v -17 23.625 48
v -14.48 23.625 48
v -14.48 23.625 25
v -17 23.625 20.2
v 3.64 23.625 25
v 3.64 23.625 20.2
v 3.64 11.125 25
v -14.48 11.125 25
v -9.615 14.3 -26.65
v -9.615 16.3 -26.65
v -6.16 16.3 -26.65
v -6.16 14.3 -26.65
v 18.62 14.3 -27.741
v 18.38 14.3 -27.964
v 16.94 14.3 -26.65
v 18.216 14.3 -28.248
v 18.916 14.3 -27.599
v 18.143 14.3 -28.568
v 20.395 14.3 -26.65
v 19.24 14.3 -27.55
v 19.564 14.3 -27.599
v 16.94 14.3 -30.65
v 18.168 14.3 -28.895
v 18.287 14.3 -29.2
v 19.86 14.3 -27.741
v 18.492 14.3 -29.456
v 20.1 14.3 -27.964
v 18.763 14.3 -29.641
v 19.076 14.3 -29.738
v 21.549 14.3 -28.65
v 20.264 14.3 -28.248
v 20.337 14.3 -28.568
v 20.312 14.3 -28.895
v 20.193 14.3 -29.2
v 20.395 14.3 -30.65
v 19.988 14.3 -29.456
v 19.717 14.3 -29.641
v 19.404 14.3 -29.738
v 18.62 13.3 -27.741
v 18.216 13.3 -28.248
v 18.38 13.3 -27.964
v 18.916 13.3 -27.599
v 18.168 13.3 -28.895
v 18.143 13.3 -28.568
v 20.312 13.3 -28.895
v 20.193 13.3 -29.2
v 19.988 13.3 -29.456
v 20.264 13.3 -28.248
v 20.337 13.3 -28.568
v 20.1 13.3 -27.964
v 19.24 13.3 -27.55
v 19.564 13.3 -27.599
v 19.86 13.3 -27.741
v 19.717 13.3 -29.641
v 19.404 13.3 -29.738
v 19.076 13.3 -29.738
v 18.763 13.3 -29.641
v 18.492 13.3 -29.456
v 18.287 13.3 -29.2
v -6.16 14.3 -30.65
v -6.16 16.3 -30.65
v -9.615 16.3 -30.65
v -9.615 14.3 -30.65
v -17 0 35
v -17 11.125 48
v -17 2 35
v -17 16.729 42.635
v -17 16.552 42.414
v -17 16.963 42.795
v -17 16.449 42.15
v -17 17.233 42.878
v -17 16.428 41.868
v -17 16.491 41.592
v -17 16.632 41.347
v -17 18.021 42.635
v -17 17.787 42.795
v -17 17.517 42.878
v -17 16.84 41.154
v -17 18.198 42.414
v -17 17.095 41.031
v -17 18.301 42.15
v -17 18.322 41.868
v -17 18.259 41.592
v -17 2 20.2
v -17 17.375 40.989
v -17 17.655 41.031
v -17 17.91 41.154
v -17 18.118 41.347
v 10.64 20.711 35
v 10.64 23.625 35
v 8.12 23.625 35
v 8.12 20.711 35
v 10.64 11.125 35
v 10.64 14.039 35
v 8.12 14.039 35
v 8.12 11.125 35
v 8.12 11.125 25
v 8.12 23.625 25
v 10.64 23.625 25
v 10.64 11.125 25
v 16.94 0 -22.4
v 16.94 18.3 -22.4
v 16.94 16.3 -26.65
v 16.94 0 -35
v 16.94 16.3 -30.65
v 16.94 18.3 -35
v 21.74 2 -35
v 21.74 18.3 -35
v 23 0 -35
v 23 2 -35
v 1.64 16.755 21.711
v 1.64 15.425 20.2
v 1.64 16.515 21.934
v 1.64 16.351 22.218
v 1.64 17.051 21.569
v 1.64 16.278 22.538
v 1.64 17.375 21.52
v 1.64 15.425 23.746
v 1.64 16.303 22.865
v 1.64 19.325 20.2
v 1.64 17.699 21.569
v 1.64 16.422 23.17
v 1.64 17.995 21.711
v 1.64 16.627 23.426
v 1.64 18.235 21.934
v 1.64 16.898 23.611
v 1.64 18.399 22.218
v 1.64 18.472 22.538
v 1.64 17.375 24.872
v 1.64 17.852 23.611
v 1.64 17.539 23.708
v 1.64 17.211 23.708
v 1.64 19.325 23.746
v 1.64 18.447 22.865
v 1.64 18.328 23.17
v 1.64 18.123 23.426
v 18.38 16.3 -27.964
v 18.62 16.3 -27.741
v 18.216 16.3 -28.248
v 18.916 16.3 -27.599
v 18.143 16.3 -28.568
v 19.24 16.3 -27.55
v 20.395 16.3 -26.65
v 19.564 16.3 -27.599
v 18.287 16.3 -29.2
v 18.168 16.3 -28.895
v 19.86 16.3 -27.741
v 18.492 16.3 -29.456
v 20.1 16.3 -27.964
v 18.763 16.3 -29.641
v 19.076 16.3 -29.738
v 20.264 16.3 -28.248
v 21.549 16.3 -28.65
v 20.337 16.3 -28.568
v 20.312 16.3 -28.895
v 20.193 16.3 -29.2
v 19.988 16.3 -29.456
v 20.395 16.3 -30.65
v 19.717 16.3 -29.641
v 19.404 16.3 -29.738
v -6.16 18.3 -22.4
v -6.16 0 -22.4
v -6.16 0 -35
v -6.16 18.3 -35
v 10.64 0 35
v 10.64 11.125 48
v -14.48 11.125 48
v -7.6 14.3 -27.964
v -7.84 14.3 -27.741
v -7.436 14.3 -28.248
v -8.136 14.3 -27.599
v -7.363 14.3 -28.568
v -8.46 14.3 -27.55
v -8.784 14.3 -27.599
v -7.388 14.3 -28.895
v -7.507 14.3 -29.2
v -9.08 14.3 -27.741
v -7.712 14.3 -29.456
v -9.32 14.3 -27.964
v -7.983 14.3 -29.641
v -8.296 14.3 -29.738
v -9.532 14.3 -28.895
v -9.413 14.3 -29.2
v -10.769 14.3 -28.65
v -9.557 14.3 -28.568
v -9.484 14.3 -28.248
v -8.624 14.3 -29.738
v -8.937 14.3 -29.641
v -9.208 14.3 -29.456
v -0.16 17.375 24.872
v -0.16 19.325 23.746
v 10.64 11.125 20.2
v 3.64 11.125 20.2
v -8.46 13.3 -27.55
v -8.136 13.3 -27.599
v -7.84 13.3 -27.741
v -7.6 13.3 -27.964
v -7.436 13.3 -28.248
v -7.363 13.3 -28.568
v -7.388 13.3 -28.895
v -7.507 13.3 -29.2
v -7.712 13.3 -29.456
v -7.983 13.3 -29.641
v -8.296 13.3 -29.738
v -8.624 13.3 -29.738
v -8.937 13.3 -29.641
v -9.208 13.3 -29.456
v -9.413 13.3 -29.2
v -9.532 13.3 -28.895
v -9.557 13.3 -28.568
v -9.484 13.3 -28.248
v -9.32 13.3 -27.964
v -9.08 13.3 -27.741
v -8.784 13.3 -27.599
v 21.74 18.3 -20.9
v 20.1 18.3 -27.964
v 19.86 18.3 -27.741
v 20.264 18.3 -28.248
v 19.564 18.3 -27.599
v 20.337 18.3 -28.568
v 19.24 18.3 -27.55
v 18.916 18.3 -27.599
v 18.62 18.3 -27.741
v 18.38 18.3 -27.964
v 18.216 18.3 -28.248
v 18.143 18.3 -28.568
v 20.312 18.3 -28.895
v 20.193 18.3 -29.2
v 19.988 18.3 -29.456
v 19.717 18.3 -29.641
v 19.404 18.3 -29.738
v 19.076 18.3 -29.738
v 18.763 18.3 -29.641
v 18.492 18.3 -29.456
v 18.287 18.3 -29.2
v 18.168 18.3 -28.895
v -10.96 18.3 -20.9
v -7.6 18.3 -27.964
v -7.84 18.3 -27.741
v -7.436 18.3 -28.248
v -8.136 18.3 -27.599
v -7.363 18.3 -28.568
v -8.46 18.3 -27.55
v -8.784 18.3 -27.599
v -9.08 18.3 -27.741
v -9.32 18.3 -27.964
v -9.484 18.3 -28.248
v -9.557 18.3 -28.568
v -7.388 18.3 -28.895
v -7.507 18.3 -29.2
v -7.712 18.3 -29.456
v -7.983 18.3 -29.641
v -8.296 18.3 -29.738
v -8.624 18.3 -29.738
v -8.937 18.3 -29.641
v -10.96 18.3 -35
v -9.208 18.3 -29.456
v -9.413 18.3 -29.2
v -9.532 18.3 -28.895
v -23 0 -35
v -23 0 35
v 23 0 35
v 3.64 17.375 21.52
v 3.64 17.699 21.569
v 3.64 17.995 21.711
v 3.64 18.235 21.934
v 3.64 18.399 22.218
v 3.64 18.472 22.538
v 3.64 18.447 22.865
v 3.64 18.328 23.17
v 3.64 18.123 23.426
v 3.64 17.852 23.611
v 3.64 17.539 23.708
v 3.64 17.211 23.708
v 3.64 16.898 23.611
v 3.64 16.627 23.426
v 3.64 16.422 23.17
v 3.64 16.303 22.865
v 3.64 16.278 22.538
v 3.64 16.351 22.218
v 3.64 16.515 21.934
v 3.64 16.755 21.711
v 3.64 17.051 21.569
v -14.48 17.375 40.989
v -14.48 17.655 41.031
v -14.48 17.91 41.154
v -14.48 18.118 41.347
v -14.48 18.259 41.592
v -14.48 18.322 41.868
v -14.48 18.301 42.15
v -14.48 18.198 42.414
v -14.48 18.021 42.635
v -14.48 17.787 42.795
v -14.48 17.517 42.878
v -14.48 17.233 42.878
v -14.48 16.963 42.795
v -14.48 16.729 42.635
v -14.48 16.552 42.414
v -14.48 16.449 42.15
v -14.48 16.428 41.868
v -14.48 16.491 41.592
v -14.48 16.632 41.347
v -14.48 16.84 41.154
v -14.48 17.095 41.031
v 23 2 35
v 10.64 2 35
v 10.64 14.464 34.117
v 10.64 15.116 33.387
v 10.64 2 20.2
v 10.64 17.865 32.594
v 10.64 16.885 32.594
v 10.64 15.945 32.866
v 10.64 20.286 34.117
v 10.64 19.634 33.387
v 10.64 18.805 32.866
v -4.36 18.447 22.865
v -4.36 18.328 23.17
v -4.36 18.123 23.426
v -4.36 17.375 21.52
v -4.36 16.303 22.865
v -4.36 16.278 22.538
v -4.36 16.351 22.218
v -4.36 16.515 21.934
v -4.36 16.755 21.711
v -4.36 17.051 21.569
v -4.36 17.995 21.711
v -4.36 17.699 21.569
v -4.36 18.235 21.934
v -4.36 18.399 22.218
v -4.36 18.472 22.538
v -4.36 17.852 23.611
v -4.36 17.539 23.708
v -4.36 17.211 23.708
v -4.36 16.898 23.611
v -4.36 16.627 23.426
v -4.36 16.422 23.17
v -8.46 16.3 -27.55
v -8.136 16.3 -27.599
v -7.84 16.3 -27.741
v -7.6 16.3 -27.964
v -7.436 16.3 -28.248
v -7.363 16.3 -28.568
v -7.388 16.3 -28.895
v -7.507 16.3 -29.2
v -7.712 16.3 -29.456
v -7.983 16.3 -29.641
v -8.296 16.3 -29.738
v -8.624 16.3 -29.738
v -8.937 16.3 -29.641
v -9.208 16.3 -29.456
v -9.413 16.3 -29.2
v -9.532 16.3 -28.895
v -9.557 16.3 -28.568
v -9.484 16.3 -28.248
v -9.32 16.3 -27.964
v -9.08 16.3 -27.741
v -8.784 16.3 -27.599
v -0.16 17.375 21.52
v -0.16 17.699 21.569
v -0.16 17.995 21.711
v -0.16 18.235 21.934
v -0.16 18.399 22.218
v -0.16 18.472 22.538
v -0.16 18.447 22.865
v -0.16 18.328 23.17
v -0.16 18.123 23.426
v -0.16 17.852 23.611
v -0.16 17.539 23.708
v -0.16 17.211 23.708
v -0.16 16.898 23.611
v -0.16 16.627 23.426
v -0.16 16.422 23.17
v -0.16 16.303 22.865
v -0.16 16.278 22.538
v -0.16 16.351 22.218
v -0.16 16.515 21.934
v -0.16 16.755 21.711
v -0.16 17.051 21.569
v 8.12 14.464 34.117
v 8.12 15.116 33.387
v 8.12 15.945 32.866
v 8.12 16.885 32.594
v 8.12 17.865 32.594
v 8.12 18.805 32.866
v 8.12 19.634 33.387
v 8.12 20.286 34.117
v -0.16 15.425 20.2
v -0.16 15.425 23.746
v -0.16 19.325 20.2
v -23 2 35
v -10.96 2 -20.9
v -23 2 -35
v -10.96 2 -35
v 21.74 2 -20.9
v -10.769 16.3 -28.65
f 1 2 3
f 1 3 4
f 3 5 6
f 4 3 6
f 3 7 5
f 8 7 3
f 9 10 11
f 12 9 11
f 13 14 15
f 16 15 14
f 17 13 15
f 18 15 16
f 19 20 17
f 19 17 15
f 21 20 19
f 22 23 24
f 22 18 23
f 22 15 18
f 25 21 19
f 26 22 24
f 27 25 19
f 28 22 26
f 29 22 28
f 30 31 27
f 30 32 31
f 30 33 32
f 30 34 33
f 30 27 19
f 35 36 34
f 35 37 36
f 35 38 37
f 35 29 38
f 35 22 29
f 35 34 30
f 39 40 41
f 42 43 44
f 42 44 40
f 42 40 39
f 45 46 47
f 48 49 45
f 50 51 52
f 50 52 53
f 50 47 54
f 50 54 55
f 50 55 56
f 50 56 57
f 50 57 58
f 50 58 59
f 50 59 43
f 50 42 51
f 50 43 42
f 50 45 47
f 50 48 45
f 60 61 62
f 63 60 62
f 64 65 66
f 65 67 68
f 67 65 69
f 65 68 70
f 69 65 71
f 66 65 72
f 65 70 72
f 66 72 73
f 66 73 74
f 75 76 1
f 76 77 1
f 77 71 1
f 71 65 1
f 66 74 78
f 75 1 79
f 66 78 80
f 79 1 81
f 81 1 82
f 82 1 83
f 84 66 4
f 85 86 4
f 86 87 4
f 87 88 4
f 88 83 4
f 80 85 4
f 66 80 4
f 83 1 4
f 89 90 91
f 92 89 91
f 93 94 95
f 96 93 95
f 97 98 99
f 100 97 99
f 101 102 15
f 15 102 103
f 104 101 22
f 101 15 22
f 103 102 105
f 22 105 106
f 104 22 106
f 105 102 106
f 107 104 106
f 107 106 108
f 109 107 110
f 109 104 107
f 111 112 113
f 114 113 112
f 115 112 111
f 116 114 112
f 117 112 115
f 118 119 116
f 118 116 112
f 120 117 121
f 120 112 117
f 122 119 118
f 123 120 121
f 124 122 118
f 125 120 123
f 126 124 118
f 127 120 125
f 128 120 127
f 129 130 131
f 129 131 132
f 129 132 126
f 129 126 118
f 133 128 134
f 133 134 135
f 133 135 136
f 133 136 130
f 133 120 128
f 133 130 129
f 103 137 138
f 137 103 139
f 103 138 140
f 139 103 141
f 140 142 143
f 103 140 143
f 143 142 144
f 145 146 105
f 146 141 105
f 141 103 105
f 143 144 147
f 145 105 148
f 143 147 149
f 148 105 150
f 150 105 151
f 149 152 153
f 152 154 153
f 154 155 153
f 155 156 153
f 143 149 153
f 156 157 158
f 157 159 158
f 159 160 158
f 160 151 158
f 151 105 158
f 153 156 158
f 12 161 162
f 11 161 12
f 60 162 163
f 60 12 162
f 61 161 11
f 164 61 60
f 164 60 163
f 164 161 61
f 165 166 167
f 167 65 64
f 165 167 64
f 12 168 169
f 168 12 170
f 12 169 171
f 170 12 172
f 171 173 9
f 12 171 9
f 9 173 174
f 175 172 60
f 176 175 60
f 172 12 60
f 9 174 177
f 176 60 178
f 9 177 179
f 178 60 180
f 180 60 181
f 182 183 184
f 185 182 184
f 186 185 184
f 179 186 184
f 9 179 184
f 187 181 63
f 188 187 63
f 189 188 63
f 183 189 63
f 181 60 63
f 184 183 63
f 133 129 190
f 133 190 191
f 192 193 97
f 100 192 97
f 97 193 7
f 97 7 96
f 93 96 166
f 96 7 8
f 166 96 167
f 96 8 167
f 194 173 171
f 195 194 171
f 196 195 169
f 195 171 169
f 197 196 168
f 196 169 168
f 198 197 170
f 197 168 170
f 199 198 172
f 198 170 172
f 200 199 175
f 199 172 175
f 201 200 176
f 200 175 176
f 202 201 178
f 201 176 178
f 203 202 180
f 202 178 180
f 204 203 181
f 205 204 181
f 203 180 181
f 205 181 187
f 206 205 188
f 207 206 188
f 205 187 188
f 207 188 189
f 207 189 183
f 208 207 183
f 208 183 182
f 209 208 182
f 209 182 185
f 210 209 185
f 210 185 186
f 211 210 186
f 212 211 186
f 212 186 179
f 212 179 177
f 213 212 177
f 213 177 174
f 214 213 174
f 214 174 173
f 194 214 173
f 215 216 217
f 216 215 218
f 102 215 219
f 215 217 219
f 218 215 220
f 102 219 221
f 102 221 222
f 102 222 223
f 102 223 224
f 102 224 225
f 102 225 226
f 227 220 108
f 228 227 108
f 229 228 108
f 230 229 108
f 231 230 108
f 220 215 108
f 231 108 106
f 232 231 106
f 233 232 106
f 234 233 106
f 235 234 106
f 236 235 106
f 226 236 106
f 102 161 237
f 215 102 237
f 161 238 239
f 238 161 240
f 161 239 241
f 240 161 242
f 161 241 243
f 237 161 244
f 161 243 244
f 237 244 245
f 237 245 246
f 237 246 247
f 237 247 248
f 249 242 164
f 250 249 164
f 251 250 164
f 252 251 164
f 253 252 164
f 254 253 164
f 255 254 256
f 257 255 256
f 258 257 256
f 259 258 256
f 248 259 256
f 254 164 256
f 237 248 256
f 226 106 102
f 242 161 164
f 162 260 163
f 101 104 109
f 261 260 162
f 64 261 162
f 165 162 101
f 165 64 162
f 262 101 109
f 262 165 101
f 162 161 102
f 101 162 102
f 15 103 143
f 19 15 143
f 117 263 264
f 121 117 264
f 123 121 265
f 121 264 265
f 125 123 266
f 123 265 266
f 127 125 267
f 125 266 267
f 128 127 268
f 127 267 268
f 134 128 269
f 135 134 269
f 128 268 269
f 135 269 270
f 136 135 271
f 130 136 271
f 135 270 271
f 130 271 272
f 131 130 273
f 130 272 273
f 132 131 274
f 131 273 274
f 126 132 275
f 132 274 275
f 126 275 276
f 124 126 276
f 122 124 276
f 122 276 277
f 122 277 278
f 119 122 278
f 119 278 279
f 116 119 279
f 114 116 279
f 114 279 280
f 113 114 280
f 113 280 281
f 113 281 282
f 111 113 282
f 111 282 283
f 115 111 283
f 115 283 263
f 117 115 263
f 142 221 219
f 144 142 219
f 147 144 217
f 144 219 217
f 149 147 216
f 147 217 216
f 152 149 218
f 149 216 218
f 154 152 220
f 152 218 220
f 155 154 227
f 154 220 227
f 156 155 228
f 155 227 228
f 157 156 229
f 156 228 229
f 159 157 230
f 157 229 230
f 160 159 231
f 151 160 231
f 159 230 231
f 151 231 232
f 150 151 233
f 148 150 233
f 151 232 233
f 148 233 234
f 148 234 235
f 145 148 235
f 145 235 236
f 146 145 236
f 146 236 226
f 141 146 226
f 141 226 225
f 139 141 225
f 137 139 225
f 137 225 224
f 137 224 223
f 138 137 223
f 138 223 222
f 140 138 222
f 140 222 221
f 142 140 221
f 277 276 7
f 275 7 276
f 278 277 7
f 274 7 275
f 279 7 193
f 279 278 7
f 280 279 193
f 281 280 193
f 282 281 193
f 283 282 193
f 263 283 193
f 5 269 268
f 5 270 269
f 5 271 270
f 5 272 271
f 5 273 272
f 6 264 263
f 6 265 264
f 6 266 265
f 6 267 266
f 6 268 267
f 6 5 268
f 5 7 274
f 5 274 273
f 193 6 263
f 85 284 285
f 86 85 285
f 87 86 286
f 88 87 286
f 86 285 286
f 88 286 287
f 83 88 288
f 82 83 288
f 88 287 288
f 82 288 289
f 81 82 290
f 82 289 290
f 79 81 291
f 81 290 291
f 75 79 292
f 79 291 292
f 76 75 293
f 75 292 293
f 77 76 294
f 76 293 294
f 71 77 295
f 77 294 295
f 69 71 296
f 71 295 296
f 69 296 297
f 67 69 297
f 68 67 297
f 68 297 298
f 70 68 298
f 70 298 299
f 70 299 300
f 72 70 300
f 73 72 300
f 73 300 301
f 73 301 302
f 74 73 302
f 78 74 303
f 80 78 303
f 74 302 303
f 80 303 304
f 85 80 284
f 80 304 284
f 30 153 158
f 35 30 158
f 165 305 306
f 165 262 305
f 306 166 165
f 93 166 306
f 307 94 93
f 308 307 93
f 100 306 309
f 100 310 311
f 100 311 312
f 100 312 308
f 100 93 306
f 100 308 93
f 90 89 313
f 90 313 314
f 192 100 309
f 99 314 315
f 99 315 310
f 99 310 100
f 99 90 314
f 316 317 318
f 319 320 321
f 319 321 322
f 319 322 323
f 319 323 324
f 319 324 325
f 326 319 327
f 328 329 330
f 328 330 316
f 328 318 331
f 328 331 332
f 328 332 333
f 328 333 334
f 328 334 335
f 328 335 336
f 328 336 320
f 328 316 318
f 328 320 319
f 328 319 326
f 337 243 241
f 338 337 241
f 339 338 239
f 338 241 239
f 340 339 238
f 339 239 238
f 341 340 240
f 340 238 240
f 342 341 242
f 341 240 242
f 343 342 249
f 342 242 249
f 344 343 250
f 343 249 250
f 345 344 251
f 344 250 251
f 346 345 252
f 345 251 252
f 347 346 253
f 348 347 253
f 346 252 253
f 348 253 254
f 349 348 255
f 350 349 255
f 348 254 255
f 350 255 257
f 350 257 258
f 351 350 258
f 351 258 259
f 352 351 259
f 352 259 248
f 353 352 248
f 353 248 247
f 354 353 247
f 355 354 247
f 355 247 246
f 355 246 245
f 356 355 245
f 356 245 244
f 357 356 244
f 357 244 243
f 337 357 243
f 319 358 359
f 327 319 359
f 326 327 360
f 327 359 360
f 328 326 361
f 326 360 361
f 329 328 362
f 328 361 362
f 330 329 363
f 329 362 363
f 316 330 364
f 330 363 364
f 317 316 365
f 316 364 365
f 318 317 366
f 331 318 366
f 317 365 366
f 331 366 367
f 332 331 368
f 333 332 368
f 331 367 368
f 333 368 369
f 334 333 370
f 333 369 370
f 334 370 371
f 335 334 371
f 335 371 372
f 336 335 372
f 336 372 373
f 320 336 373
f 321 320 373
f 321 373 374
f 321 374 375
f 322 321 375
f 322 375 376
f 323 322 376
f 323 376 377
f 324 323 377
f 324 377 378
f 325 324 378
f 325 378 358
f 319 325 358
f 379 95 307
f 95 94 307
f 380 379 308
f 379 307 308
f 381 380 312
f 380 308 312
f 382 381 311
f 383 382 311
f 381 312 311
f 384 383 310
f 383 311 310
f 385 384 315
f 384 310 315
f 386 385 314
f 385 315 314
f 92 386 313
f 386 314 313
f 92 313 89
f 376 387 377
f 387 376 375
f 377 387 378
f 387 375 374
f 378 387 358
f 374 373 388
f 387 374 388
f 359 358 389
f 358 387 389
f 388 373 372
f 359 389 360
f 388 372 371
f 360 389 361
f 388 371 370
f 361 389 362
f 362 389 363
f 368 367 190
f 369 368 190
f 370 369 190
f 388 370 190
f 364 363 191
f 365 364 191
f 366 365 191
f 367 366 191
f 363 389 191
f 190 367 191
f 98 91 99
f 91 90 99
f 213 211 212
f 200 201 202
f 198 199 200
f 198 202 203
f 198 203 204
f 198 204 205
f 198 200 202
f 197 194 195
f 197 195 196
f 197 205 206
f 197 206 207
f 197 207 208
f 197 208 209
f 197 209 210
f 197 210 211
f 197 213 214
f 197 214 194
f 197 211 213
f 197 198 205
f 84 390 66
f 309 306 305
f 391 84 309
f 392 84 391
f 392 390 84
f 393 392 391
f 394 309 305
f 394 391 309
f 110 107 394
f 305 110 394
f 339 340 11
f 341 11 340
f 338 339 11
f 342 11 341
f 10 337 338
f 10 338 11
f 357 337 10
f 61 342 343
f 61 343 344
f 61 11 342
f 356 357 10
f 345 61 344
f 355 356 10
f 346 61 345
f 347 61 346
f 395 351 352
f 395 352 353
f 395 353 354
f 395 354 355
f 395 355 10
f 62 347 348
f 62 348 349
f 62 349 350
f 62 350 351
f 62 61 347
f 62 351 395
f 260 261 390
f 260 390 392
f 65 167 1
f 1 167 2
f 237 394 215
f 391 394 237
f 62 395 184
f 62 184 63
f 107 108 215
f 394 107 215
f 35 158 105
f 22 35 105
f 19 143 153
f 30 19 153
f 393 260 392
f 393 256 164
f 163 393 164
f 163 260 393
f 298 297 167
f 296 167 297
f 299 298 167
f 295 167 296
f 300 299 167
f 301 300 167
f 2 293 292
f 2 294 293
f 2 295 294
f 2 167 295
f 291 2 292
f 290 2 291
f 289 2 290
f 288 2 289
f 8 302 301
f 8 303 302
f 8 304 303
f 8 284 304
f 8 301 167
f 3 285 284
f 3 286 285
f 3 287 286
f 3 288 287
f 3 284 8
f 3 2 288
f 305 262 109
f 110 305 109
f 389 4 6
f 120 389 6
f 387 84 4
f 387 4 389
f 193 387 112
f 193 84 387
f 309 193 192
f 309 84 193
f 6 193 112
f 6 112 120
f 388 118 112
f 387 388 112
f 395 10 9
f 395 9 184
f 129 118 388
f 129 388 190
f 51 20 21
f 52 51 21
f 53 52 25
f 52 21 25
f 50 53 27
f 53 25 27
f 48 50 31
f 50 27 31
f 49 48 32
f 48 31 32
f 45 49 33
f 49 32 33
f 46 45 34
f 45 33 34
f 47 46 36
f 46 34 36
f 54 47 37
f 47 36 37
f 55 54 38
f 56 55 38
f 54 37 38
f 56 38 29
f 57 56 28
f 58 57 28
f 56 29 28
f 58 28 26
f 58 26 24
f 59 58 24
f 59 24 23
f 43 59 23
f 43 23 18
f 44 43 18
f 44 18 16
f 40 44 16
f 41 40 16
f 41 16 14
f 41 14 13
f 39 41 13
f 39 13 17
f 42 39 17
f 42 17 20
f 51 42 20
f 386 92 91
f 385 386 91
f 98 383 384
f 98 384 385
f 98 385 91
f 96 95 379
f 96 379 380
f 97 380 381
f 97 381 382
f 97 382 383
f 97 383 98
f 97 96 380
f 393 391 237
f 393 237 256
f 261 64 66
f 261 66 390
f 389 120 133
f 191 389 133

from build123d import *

# Parameters (mm, degrees)
SKETCH1_W           = 46
SKETCH1_H           = 70
BOSS_EXTRUDE1_DEPTH = 2
BOSS_EXTRUDE2_DEPTH = 16.3
SKETCH3_W           = 23.1
SKETCH3_H           = 12.6
CUT_EXTRUDE1_DEPTH  = 45.940961271
SKETCH4_W           = 34
SKETCH4_H           = 14.8
BOSS_EXTRUDE3_DEPTH = 11.125
BOSS_EXTRUDE4_DEPTH = 12.5
SKETCH7_W           = 6.36
SKETCH7_H           = 14.8
CUT_EXTRUDE2_DEPTH  = 9.125
SKETCH8_W           = 13
SKETCH8_H           = 12.5
SKETCH8_R           = 0.95
BOSS_EXTRUDE5_DEPTH = 2.52
BOSS_EXTRUDE6_DEPTH = 27.64
SKETCH10_W          = 7
SKETCH10_H          = 4.8
CUT_EXTRUDE3_DEPTH  = 12.5
SKETCH11_R          = 3.5
CUT_EXTRUDE4_DEPTH  = 10
SKETCH12_R          = 1.1
CUT_EXTRUDE5_DEPTH  = 8
CUT_EXTRUDE6_DEPTH  = 1.8
SKETCH14_R          = 1.1
CUT_EXTRUDE7_DEPTH  = 5
CUT_EXTRUDE8_DEPTH  = 2


with BuildPart() as part:
    # Sketch1 → Boss-Extrude1 (new body)
    with BuildSketch(Plane(origin=(0, 0, 0), x_dir=(1, 0, 0), z_dir=(0, 1, 0))):
        Rectangle(SKETCH1_W, SKETCH1_H)
    extrude(amount=BOSS_EXTRUDE1_DEPTH)

    # Sketch2 → Boss-Extrude2 (add)
    with BuildSketch(Plane(origin=(0, 2, 0), x_dir=(1, 0, 0), z_dir=(0, 1, 0))):
        Polygon((16.94, 22.4), (16.94, 35), (21.74, 35), (21.74, 20.9), (-10.96, 20.9), (-10.96, 35), (-6.16, 35), (-6.16, 22.4), align=None)
    extrude(amount=BOSS_EXTRUDE2_DEPTH)

    # Sketch3 → Cut-Extrude1 (cut, through all)
    with BuildSketch(Plane(origin=(0, 2, 0), x_dir=(1, 0, 0), z_dir=(0, 1, 0))):
        with Locations((5.39, 28.7)):
            Rectangle(SKETCH3_W, SKETCH3_H)
    extrude(amount=-CUT_EXTRUDE1_DEPTH, mode=Mode.SUBTRACT)

    # Sketch4 → Boss-Extrude3 (add)
    with BuildSketch(Plane.XZ):
        with Locations((0, 27.6)):
            Rectangle(SKETCH4_W, SKETCH4_H)
    extrude(amount=-BOSS_EXTRUDE3_DEPTH)

    # Sketch5 → Boss-Extrude4 (add)
    with BuildSketch(Plane(origin=(0, 11.125, 0), x_dir=(1, 0, 0), z_dir=(0, 1, 0))):
        Polygon((-14.48, -35), (-17, -35), (-17, -20.2), (10.64, -20.2), (10.64, -35), (8.12, -35), (8.12, -25), (-14.48, -25), align=None)
    extrude(amount=BOSS_EXTRUDE4_DEPTH)

    # Sketch7 → Cut-Extrude2 (cut)
    with BuildSketch(Plane(origin=(0, 11.125, 0), x_dir=(1, 0, 0), z_dir=(0, 1, 0))):
        with Locations((13.82, -27.6)):
            Rectangle(SKETCH7_W, SKETCH7_H)
    extrude(amount=-CUT_EXTRUDE2_DEPTH, mode=Mode.SUBTRACT)

    # Sketch8 → Boss-Extrude5 (add)
    with BuildSketch(Plane(origin=(-14.48, 0, 0), x_dir=(0, 0, -1), z_dir=(1, 0, 0))):
        with Locations((-41.5, 17.375)):
            Rectangle(SKETCH8_W, SKETCH8_H)
        with Locations((-41.939, 17.375)):
            Circle(SKETCH8_R, mode=Mode.SUBTRACT)
    extrude(amount=-BOSS_EXTRUDE5_DEPTH)

    # Sketch9 → Boss-Extrude6 (add)
    with BuildSketch(Plane.ZY.offset(17)):
        Polygon((48, 11.125), (35, 0), (35, 11.125), align=None)
    extrude(amount=-BOSS_EXTRUDE6_DEPTH)

    # Sketch10 → Cut-Extrude3 (cut)
    with BuildSketch(Plane(origin=(0, 23.625, 0), x_dir=(1, 0, 0), z_dir=(0, 1, 0))):
        with Locations((7.14, -22.6)):
            Rectangle(SKETCH10_W, SKETCH10_H)
    extrude(amount=-CUT_EXTRUDE3_DEPTH, mode=Mode.SUBTRACT)

    # Sketch11 → Cut-Extrude4 (cut)
    with BuildSketch(Plane(origin=(10.64, 0, 0), x_dir=(0, 0, -1), z_dir=(1, 0, 0))):
        with Locations((-36.06, 17.375)):
            Circle(SKETCH11_R)
    extrude(amount=-CUT_EXTRUDE4_DEPTH, mode=Mode.SUBTRACT)

    # Sketch12 → Cut-Extrude5 (cut)
    with BuildSketch(Plane(origin=(3.64, 0, 0), x_dir=(0, 0, -1), z_dir=(1, 0, 0))):
        with Locations((-22.62, 17.375)):
            Circle(SKETCH12_R)
    extrude(amount=-CUT_EXTRUDE5_DEPTH, mode=Mode.SUBTRACT)

    # Sketch13 → Cut-Extrude6 (cut)
    with BuildSketch(Plane(origin=(1.64, 0, 0), x_dir=(0, 0, -1), z_dir=(1, 0, 0))):
        Polygon((-21.494166975, 19.325), (-19.2, 19.325), (-19.2, 15.425), (-21.494166975, 15.425), (-23.745833025, 15.425), (-24.87166605, 17.375), (-23.745833025, 19.325), align=None)
    extrude(amount=-CUT_EXTRUDE6_DEPTH, mode=Mode.SUBTRACT)

    # Sketch14 → Cut-Extrude7 (cut)
    with BuildSketch(Plane(origin=(0, 18.3, 0), x_dir=(1, 0, 0), z_dir=(0, 1, 0))):
        with Locations(Location((-8.46, 28.65, 0), (0, 0, 270))):
            Circle(SKETCH14_R)
        with Locations(Location((19.24, 28.65, 0), (0, 0, 270))):
            Circle(SKETCH14_R)
    extrude(amount=-CUT_EXTRUDE7_DEPTH, mode=Mode.SUBTRACT)

    # Sketch15 → Cut-Extrude8 (cut)
    with BuildSketch(Plane(origin=(0, 16.3, 0), x_dir=(1, 0, 0), z_dir=(0, 1, 0))):
        Polygon((18.085299462, 30.65), (16.94, 30.65), (16.94, 26.65), (18.085299462, 26.65), (20.394700538, 26.65), (21.549401077, 28.65), (20.394700538, 30.65), align=None)
        Polygon((-6.16, 26.65), (-7.305299462, 26.65), (-9.614700538, 26.65), (-10.769401077, 28.65), (-9.614700538, 30.65), (-7.305299462, 30.65), (-6.16, 30.65), align=None)
    extrude(amount=-CUT_EXTRUDE8_DEPTH, mode=Mode.SUBTRACT)


solid = part.part
